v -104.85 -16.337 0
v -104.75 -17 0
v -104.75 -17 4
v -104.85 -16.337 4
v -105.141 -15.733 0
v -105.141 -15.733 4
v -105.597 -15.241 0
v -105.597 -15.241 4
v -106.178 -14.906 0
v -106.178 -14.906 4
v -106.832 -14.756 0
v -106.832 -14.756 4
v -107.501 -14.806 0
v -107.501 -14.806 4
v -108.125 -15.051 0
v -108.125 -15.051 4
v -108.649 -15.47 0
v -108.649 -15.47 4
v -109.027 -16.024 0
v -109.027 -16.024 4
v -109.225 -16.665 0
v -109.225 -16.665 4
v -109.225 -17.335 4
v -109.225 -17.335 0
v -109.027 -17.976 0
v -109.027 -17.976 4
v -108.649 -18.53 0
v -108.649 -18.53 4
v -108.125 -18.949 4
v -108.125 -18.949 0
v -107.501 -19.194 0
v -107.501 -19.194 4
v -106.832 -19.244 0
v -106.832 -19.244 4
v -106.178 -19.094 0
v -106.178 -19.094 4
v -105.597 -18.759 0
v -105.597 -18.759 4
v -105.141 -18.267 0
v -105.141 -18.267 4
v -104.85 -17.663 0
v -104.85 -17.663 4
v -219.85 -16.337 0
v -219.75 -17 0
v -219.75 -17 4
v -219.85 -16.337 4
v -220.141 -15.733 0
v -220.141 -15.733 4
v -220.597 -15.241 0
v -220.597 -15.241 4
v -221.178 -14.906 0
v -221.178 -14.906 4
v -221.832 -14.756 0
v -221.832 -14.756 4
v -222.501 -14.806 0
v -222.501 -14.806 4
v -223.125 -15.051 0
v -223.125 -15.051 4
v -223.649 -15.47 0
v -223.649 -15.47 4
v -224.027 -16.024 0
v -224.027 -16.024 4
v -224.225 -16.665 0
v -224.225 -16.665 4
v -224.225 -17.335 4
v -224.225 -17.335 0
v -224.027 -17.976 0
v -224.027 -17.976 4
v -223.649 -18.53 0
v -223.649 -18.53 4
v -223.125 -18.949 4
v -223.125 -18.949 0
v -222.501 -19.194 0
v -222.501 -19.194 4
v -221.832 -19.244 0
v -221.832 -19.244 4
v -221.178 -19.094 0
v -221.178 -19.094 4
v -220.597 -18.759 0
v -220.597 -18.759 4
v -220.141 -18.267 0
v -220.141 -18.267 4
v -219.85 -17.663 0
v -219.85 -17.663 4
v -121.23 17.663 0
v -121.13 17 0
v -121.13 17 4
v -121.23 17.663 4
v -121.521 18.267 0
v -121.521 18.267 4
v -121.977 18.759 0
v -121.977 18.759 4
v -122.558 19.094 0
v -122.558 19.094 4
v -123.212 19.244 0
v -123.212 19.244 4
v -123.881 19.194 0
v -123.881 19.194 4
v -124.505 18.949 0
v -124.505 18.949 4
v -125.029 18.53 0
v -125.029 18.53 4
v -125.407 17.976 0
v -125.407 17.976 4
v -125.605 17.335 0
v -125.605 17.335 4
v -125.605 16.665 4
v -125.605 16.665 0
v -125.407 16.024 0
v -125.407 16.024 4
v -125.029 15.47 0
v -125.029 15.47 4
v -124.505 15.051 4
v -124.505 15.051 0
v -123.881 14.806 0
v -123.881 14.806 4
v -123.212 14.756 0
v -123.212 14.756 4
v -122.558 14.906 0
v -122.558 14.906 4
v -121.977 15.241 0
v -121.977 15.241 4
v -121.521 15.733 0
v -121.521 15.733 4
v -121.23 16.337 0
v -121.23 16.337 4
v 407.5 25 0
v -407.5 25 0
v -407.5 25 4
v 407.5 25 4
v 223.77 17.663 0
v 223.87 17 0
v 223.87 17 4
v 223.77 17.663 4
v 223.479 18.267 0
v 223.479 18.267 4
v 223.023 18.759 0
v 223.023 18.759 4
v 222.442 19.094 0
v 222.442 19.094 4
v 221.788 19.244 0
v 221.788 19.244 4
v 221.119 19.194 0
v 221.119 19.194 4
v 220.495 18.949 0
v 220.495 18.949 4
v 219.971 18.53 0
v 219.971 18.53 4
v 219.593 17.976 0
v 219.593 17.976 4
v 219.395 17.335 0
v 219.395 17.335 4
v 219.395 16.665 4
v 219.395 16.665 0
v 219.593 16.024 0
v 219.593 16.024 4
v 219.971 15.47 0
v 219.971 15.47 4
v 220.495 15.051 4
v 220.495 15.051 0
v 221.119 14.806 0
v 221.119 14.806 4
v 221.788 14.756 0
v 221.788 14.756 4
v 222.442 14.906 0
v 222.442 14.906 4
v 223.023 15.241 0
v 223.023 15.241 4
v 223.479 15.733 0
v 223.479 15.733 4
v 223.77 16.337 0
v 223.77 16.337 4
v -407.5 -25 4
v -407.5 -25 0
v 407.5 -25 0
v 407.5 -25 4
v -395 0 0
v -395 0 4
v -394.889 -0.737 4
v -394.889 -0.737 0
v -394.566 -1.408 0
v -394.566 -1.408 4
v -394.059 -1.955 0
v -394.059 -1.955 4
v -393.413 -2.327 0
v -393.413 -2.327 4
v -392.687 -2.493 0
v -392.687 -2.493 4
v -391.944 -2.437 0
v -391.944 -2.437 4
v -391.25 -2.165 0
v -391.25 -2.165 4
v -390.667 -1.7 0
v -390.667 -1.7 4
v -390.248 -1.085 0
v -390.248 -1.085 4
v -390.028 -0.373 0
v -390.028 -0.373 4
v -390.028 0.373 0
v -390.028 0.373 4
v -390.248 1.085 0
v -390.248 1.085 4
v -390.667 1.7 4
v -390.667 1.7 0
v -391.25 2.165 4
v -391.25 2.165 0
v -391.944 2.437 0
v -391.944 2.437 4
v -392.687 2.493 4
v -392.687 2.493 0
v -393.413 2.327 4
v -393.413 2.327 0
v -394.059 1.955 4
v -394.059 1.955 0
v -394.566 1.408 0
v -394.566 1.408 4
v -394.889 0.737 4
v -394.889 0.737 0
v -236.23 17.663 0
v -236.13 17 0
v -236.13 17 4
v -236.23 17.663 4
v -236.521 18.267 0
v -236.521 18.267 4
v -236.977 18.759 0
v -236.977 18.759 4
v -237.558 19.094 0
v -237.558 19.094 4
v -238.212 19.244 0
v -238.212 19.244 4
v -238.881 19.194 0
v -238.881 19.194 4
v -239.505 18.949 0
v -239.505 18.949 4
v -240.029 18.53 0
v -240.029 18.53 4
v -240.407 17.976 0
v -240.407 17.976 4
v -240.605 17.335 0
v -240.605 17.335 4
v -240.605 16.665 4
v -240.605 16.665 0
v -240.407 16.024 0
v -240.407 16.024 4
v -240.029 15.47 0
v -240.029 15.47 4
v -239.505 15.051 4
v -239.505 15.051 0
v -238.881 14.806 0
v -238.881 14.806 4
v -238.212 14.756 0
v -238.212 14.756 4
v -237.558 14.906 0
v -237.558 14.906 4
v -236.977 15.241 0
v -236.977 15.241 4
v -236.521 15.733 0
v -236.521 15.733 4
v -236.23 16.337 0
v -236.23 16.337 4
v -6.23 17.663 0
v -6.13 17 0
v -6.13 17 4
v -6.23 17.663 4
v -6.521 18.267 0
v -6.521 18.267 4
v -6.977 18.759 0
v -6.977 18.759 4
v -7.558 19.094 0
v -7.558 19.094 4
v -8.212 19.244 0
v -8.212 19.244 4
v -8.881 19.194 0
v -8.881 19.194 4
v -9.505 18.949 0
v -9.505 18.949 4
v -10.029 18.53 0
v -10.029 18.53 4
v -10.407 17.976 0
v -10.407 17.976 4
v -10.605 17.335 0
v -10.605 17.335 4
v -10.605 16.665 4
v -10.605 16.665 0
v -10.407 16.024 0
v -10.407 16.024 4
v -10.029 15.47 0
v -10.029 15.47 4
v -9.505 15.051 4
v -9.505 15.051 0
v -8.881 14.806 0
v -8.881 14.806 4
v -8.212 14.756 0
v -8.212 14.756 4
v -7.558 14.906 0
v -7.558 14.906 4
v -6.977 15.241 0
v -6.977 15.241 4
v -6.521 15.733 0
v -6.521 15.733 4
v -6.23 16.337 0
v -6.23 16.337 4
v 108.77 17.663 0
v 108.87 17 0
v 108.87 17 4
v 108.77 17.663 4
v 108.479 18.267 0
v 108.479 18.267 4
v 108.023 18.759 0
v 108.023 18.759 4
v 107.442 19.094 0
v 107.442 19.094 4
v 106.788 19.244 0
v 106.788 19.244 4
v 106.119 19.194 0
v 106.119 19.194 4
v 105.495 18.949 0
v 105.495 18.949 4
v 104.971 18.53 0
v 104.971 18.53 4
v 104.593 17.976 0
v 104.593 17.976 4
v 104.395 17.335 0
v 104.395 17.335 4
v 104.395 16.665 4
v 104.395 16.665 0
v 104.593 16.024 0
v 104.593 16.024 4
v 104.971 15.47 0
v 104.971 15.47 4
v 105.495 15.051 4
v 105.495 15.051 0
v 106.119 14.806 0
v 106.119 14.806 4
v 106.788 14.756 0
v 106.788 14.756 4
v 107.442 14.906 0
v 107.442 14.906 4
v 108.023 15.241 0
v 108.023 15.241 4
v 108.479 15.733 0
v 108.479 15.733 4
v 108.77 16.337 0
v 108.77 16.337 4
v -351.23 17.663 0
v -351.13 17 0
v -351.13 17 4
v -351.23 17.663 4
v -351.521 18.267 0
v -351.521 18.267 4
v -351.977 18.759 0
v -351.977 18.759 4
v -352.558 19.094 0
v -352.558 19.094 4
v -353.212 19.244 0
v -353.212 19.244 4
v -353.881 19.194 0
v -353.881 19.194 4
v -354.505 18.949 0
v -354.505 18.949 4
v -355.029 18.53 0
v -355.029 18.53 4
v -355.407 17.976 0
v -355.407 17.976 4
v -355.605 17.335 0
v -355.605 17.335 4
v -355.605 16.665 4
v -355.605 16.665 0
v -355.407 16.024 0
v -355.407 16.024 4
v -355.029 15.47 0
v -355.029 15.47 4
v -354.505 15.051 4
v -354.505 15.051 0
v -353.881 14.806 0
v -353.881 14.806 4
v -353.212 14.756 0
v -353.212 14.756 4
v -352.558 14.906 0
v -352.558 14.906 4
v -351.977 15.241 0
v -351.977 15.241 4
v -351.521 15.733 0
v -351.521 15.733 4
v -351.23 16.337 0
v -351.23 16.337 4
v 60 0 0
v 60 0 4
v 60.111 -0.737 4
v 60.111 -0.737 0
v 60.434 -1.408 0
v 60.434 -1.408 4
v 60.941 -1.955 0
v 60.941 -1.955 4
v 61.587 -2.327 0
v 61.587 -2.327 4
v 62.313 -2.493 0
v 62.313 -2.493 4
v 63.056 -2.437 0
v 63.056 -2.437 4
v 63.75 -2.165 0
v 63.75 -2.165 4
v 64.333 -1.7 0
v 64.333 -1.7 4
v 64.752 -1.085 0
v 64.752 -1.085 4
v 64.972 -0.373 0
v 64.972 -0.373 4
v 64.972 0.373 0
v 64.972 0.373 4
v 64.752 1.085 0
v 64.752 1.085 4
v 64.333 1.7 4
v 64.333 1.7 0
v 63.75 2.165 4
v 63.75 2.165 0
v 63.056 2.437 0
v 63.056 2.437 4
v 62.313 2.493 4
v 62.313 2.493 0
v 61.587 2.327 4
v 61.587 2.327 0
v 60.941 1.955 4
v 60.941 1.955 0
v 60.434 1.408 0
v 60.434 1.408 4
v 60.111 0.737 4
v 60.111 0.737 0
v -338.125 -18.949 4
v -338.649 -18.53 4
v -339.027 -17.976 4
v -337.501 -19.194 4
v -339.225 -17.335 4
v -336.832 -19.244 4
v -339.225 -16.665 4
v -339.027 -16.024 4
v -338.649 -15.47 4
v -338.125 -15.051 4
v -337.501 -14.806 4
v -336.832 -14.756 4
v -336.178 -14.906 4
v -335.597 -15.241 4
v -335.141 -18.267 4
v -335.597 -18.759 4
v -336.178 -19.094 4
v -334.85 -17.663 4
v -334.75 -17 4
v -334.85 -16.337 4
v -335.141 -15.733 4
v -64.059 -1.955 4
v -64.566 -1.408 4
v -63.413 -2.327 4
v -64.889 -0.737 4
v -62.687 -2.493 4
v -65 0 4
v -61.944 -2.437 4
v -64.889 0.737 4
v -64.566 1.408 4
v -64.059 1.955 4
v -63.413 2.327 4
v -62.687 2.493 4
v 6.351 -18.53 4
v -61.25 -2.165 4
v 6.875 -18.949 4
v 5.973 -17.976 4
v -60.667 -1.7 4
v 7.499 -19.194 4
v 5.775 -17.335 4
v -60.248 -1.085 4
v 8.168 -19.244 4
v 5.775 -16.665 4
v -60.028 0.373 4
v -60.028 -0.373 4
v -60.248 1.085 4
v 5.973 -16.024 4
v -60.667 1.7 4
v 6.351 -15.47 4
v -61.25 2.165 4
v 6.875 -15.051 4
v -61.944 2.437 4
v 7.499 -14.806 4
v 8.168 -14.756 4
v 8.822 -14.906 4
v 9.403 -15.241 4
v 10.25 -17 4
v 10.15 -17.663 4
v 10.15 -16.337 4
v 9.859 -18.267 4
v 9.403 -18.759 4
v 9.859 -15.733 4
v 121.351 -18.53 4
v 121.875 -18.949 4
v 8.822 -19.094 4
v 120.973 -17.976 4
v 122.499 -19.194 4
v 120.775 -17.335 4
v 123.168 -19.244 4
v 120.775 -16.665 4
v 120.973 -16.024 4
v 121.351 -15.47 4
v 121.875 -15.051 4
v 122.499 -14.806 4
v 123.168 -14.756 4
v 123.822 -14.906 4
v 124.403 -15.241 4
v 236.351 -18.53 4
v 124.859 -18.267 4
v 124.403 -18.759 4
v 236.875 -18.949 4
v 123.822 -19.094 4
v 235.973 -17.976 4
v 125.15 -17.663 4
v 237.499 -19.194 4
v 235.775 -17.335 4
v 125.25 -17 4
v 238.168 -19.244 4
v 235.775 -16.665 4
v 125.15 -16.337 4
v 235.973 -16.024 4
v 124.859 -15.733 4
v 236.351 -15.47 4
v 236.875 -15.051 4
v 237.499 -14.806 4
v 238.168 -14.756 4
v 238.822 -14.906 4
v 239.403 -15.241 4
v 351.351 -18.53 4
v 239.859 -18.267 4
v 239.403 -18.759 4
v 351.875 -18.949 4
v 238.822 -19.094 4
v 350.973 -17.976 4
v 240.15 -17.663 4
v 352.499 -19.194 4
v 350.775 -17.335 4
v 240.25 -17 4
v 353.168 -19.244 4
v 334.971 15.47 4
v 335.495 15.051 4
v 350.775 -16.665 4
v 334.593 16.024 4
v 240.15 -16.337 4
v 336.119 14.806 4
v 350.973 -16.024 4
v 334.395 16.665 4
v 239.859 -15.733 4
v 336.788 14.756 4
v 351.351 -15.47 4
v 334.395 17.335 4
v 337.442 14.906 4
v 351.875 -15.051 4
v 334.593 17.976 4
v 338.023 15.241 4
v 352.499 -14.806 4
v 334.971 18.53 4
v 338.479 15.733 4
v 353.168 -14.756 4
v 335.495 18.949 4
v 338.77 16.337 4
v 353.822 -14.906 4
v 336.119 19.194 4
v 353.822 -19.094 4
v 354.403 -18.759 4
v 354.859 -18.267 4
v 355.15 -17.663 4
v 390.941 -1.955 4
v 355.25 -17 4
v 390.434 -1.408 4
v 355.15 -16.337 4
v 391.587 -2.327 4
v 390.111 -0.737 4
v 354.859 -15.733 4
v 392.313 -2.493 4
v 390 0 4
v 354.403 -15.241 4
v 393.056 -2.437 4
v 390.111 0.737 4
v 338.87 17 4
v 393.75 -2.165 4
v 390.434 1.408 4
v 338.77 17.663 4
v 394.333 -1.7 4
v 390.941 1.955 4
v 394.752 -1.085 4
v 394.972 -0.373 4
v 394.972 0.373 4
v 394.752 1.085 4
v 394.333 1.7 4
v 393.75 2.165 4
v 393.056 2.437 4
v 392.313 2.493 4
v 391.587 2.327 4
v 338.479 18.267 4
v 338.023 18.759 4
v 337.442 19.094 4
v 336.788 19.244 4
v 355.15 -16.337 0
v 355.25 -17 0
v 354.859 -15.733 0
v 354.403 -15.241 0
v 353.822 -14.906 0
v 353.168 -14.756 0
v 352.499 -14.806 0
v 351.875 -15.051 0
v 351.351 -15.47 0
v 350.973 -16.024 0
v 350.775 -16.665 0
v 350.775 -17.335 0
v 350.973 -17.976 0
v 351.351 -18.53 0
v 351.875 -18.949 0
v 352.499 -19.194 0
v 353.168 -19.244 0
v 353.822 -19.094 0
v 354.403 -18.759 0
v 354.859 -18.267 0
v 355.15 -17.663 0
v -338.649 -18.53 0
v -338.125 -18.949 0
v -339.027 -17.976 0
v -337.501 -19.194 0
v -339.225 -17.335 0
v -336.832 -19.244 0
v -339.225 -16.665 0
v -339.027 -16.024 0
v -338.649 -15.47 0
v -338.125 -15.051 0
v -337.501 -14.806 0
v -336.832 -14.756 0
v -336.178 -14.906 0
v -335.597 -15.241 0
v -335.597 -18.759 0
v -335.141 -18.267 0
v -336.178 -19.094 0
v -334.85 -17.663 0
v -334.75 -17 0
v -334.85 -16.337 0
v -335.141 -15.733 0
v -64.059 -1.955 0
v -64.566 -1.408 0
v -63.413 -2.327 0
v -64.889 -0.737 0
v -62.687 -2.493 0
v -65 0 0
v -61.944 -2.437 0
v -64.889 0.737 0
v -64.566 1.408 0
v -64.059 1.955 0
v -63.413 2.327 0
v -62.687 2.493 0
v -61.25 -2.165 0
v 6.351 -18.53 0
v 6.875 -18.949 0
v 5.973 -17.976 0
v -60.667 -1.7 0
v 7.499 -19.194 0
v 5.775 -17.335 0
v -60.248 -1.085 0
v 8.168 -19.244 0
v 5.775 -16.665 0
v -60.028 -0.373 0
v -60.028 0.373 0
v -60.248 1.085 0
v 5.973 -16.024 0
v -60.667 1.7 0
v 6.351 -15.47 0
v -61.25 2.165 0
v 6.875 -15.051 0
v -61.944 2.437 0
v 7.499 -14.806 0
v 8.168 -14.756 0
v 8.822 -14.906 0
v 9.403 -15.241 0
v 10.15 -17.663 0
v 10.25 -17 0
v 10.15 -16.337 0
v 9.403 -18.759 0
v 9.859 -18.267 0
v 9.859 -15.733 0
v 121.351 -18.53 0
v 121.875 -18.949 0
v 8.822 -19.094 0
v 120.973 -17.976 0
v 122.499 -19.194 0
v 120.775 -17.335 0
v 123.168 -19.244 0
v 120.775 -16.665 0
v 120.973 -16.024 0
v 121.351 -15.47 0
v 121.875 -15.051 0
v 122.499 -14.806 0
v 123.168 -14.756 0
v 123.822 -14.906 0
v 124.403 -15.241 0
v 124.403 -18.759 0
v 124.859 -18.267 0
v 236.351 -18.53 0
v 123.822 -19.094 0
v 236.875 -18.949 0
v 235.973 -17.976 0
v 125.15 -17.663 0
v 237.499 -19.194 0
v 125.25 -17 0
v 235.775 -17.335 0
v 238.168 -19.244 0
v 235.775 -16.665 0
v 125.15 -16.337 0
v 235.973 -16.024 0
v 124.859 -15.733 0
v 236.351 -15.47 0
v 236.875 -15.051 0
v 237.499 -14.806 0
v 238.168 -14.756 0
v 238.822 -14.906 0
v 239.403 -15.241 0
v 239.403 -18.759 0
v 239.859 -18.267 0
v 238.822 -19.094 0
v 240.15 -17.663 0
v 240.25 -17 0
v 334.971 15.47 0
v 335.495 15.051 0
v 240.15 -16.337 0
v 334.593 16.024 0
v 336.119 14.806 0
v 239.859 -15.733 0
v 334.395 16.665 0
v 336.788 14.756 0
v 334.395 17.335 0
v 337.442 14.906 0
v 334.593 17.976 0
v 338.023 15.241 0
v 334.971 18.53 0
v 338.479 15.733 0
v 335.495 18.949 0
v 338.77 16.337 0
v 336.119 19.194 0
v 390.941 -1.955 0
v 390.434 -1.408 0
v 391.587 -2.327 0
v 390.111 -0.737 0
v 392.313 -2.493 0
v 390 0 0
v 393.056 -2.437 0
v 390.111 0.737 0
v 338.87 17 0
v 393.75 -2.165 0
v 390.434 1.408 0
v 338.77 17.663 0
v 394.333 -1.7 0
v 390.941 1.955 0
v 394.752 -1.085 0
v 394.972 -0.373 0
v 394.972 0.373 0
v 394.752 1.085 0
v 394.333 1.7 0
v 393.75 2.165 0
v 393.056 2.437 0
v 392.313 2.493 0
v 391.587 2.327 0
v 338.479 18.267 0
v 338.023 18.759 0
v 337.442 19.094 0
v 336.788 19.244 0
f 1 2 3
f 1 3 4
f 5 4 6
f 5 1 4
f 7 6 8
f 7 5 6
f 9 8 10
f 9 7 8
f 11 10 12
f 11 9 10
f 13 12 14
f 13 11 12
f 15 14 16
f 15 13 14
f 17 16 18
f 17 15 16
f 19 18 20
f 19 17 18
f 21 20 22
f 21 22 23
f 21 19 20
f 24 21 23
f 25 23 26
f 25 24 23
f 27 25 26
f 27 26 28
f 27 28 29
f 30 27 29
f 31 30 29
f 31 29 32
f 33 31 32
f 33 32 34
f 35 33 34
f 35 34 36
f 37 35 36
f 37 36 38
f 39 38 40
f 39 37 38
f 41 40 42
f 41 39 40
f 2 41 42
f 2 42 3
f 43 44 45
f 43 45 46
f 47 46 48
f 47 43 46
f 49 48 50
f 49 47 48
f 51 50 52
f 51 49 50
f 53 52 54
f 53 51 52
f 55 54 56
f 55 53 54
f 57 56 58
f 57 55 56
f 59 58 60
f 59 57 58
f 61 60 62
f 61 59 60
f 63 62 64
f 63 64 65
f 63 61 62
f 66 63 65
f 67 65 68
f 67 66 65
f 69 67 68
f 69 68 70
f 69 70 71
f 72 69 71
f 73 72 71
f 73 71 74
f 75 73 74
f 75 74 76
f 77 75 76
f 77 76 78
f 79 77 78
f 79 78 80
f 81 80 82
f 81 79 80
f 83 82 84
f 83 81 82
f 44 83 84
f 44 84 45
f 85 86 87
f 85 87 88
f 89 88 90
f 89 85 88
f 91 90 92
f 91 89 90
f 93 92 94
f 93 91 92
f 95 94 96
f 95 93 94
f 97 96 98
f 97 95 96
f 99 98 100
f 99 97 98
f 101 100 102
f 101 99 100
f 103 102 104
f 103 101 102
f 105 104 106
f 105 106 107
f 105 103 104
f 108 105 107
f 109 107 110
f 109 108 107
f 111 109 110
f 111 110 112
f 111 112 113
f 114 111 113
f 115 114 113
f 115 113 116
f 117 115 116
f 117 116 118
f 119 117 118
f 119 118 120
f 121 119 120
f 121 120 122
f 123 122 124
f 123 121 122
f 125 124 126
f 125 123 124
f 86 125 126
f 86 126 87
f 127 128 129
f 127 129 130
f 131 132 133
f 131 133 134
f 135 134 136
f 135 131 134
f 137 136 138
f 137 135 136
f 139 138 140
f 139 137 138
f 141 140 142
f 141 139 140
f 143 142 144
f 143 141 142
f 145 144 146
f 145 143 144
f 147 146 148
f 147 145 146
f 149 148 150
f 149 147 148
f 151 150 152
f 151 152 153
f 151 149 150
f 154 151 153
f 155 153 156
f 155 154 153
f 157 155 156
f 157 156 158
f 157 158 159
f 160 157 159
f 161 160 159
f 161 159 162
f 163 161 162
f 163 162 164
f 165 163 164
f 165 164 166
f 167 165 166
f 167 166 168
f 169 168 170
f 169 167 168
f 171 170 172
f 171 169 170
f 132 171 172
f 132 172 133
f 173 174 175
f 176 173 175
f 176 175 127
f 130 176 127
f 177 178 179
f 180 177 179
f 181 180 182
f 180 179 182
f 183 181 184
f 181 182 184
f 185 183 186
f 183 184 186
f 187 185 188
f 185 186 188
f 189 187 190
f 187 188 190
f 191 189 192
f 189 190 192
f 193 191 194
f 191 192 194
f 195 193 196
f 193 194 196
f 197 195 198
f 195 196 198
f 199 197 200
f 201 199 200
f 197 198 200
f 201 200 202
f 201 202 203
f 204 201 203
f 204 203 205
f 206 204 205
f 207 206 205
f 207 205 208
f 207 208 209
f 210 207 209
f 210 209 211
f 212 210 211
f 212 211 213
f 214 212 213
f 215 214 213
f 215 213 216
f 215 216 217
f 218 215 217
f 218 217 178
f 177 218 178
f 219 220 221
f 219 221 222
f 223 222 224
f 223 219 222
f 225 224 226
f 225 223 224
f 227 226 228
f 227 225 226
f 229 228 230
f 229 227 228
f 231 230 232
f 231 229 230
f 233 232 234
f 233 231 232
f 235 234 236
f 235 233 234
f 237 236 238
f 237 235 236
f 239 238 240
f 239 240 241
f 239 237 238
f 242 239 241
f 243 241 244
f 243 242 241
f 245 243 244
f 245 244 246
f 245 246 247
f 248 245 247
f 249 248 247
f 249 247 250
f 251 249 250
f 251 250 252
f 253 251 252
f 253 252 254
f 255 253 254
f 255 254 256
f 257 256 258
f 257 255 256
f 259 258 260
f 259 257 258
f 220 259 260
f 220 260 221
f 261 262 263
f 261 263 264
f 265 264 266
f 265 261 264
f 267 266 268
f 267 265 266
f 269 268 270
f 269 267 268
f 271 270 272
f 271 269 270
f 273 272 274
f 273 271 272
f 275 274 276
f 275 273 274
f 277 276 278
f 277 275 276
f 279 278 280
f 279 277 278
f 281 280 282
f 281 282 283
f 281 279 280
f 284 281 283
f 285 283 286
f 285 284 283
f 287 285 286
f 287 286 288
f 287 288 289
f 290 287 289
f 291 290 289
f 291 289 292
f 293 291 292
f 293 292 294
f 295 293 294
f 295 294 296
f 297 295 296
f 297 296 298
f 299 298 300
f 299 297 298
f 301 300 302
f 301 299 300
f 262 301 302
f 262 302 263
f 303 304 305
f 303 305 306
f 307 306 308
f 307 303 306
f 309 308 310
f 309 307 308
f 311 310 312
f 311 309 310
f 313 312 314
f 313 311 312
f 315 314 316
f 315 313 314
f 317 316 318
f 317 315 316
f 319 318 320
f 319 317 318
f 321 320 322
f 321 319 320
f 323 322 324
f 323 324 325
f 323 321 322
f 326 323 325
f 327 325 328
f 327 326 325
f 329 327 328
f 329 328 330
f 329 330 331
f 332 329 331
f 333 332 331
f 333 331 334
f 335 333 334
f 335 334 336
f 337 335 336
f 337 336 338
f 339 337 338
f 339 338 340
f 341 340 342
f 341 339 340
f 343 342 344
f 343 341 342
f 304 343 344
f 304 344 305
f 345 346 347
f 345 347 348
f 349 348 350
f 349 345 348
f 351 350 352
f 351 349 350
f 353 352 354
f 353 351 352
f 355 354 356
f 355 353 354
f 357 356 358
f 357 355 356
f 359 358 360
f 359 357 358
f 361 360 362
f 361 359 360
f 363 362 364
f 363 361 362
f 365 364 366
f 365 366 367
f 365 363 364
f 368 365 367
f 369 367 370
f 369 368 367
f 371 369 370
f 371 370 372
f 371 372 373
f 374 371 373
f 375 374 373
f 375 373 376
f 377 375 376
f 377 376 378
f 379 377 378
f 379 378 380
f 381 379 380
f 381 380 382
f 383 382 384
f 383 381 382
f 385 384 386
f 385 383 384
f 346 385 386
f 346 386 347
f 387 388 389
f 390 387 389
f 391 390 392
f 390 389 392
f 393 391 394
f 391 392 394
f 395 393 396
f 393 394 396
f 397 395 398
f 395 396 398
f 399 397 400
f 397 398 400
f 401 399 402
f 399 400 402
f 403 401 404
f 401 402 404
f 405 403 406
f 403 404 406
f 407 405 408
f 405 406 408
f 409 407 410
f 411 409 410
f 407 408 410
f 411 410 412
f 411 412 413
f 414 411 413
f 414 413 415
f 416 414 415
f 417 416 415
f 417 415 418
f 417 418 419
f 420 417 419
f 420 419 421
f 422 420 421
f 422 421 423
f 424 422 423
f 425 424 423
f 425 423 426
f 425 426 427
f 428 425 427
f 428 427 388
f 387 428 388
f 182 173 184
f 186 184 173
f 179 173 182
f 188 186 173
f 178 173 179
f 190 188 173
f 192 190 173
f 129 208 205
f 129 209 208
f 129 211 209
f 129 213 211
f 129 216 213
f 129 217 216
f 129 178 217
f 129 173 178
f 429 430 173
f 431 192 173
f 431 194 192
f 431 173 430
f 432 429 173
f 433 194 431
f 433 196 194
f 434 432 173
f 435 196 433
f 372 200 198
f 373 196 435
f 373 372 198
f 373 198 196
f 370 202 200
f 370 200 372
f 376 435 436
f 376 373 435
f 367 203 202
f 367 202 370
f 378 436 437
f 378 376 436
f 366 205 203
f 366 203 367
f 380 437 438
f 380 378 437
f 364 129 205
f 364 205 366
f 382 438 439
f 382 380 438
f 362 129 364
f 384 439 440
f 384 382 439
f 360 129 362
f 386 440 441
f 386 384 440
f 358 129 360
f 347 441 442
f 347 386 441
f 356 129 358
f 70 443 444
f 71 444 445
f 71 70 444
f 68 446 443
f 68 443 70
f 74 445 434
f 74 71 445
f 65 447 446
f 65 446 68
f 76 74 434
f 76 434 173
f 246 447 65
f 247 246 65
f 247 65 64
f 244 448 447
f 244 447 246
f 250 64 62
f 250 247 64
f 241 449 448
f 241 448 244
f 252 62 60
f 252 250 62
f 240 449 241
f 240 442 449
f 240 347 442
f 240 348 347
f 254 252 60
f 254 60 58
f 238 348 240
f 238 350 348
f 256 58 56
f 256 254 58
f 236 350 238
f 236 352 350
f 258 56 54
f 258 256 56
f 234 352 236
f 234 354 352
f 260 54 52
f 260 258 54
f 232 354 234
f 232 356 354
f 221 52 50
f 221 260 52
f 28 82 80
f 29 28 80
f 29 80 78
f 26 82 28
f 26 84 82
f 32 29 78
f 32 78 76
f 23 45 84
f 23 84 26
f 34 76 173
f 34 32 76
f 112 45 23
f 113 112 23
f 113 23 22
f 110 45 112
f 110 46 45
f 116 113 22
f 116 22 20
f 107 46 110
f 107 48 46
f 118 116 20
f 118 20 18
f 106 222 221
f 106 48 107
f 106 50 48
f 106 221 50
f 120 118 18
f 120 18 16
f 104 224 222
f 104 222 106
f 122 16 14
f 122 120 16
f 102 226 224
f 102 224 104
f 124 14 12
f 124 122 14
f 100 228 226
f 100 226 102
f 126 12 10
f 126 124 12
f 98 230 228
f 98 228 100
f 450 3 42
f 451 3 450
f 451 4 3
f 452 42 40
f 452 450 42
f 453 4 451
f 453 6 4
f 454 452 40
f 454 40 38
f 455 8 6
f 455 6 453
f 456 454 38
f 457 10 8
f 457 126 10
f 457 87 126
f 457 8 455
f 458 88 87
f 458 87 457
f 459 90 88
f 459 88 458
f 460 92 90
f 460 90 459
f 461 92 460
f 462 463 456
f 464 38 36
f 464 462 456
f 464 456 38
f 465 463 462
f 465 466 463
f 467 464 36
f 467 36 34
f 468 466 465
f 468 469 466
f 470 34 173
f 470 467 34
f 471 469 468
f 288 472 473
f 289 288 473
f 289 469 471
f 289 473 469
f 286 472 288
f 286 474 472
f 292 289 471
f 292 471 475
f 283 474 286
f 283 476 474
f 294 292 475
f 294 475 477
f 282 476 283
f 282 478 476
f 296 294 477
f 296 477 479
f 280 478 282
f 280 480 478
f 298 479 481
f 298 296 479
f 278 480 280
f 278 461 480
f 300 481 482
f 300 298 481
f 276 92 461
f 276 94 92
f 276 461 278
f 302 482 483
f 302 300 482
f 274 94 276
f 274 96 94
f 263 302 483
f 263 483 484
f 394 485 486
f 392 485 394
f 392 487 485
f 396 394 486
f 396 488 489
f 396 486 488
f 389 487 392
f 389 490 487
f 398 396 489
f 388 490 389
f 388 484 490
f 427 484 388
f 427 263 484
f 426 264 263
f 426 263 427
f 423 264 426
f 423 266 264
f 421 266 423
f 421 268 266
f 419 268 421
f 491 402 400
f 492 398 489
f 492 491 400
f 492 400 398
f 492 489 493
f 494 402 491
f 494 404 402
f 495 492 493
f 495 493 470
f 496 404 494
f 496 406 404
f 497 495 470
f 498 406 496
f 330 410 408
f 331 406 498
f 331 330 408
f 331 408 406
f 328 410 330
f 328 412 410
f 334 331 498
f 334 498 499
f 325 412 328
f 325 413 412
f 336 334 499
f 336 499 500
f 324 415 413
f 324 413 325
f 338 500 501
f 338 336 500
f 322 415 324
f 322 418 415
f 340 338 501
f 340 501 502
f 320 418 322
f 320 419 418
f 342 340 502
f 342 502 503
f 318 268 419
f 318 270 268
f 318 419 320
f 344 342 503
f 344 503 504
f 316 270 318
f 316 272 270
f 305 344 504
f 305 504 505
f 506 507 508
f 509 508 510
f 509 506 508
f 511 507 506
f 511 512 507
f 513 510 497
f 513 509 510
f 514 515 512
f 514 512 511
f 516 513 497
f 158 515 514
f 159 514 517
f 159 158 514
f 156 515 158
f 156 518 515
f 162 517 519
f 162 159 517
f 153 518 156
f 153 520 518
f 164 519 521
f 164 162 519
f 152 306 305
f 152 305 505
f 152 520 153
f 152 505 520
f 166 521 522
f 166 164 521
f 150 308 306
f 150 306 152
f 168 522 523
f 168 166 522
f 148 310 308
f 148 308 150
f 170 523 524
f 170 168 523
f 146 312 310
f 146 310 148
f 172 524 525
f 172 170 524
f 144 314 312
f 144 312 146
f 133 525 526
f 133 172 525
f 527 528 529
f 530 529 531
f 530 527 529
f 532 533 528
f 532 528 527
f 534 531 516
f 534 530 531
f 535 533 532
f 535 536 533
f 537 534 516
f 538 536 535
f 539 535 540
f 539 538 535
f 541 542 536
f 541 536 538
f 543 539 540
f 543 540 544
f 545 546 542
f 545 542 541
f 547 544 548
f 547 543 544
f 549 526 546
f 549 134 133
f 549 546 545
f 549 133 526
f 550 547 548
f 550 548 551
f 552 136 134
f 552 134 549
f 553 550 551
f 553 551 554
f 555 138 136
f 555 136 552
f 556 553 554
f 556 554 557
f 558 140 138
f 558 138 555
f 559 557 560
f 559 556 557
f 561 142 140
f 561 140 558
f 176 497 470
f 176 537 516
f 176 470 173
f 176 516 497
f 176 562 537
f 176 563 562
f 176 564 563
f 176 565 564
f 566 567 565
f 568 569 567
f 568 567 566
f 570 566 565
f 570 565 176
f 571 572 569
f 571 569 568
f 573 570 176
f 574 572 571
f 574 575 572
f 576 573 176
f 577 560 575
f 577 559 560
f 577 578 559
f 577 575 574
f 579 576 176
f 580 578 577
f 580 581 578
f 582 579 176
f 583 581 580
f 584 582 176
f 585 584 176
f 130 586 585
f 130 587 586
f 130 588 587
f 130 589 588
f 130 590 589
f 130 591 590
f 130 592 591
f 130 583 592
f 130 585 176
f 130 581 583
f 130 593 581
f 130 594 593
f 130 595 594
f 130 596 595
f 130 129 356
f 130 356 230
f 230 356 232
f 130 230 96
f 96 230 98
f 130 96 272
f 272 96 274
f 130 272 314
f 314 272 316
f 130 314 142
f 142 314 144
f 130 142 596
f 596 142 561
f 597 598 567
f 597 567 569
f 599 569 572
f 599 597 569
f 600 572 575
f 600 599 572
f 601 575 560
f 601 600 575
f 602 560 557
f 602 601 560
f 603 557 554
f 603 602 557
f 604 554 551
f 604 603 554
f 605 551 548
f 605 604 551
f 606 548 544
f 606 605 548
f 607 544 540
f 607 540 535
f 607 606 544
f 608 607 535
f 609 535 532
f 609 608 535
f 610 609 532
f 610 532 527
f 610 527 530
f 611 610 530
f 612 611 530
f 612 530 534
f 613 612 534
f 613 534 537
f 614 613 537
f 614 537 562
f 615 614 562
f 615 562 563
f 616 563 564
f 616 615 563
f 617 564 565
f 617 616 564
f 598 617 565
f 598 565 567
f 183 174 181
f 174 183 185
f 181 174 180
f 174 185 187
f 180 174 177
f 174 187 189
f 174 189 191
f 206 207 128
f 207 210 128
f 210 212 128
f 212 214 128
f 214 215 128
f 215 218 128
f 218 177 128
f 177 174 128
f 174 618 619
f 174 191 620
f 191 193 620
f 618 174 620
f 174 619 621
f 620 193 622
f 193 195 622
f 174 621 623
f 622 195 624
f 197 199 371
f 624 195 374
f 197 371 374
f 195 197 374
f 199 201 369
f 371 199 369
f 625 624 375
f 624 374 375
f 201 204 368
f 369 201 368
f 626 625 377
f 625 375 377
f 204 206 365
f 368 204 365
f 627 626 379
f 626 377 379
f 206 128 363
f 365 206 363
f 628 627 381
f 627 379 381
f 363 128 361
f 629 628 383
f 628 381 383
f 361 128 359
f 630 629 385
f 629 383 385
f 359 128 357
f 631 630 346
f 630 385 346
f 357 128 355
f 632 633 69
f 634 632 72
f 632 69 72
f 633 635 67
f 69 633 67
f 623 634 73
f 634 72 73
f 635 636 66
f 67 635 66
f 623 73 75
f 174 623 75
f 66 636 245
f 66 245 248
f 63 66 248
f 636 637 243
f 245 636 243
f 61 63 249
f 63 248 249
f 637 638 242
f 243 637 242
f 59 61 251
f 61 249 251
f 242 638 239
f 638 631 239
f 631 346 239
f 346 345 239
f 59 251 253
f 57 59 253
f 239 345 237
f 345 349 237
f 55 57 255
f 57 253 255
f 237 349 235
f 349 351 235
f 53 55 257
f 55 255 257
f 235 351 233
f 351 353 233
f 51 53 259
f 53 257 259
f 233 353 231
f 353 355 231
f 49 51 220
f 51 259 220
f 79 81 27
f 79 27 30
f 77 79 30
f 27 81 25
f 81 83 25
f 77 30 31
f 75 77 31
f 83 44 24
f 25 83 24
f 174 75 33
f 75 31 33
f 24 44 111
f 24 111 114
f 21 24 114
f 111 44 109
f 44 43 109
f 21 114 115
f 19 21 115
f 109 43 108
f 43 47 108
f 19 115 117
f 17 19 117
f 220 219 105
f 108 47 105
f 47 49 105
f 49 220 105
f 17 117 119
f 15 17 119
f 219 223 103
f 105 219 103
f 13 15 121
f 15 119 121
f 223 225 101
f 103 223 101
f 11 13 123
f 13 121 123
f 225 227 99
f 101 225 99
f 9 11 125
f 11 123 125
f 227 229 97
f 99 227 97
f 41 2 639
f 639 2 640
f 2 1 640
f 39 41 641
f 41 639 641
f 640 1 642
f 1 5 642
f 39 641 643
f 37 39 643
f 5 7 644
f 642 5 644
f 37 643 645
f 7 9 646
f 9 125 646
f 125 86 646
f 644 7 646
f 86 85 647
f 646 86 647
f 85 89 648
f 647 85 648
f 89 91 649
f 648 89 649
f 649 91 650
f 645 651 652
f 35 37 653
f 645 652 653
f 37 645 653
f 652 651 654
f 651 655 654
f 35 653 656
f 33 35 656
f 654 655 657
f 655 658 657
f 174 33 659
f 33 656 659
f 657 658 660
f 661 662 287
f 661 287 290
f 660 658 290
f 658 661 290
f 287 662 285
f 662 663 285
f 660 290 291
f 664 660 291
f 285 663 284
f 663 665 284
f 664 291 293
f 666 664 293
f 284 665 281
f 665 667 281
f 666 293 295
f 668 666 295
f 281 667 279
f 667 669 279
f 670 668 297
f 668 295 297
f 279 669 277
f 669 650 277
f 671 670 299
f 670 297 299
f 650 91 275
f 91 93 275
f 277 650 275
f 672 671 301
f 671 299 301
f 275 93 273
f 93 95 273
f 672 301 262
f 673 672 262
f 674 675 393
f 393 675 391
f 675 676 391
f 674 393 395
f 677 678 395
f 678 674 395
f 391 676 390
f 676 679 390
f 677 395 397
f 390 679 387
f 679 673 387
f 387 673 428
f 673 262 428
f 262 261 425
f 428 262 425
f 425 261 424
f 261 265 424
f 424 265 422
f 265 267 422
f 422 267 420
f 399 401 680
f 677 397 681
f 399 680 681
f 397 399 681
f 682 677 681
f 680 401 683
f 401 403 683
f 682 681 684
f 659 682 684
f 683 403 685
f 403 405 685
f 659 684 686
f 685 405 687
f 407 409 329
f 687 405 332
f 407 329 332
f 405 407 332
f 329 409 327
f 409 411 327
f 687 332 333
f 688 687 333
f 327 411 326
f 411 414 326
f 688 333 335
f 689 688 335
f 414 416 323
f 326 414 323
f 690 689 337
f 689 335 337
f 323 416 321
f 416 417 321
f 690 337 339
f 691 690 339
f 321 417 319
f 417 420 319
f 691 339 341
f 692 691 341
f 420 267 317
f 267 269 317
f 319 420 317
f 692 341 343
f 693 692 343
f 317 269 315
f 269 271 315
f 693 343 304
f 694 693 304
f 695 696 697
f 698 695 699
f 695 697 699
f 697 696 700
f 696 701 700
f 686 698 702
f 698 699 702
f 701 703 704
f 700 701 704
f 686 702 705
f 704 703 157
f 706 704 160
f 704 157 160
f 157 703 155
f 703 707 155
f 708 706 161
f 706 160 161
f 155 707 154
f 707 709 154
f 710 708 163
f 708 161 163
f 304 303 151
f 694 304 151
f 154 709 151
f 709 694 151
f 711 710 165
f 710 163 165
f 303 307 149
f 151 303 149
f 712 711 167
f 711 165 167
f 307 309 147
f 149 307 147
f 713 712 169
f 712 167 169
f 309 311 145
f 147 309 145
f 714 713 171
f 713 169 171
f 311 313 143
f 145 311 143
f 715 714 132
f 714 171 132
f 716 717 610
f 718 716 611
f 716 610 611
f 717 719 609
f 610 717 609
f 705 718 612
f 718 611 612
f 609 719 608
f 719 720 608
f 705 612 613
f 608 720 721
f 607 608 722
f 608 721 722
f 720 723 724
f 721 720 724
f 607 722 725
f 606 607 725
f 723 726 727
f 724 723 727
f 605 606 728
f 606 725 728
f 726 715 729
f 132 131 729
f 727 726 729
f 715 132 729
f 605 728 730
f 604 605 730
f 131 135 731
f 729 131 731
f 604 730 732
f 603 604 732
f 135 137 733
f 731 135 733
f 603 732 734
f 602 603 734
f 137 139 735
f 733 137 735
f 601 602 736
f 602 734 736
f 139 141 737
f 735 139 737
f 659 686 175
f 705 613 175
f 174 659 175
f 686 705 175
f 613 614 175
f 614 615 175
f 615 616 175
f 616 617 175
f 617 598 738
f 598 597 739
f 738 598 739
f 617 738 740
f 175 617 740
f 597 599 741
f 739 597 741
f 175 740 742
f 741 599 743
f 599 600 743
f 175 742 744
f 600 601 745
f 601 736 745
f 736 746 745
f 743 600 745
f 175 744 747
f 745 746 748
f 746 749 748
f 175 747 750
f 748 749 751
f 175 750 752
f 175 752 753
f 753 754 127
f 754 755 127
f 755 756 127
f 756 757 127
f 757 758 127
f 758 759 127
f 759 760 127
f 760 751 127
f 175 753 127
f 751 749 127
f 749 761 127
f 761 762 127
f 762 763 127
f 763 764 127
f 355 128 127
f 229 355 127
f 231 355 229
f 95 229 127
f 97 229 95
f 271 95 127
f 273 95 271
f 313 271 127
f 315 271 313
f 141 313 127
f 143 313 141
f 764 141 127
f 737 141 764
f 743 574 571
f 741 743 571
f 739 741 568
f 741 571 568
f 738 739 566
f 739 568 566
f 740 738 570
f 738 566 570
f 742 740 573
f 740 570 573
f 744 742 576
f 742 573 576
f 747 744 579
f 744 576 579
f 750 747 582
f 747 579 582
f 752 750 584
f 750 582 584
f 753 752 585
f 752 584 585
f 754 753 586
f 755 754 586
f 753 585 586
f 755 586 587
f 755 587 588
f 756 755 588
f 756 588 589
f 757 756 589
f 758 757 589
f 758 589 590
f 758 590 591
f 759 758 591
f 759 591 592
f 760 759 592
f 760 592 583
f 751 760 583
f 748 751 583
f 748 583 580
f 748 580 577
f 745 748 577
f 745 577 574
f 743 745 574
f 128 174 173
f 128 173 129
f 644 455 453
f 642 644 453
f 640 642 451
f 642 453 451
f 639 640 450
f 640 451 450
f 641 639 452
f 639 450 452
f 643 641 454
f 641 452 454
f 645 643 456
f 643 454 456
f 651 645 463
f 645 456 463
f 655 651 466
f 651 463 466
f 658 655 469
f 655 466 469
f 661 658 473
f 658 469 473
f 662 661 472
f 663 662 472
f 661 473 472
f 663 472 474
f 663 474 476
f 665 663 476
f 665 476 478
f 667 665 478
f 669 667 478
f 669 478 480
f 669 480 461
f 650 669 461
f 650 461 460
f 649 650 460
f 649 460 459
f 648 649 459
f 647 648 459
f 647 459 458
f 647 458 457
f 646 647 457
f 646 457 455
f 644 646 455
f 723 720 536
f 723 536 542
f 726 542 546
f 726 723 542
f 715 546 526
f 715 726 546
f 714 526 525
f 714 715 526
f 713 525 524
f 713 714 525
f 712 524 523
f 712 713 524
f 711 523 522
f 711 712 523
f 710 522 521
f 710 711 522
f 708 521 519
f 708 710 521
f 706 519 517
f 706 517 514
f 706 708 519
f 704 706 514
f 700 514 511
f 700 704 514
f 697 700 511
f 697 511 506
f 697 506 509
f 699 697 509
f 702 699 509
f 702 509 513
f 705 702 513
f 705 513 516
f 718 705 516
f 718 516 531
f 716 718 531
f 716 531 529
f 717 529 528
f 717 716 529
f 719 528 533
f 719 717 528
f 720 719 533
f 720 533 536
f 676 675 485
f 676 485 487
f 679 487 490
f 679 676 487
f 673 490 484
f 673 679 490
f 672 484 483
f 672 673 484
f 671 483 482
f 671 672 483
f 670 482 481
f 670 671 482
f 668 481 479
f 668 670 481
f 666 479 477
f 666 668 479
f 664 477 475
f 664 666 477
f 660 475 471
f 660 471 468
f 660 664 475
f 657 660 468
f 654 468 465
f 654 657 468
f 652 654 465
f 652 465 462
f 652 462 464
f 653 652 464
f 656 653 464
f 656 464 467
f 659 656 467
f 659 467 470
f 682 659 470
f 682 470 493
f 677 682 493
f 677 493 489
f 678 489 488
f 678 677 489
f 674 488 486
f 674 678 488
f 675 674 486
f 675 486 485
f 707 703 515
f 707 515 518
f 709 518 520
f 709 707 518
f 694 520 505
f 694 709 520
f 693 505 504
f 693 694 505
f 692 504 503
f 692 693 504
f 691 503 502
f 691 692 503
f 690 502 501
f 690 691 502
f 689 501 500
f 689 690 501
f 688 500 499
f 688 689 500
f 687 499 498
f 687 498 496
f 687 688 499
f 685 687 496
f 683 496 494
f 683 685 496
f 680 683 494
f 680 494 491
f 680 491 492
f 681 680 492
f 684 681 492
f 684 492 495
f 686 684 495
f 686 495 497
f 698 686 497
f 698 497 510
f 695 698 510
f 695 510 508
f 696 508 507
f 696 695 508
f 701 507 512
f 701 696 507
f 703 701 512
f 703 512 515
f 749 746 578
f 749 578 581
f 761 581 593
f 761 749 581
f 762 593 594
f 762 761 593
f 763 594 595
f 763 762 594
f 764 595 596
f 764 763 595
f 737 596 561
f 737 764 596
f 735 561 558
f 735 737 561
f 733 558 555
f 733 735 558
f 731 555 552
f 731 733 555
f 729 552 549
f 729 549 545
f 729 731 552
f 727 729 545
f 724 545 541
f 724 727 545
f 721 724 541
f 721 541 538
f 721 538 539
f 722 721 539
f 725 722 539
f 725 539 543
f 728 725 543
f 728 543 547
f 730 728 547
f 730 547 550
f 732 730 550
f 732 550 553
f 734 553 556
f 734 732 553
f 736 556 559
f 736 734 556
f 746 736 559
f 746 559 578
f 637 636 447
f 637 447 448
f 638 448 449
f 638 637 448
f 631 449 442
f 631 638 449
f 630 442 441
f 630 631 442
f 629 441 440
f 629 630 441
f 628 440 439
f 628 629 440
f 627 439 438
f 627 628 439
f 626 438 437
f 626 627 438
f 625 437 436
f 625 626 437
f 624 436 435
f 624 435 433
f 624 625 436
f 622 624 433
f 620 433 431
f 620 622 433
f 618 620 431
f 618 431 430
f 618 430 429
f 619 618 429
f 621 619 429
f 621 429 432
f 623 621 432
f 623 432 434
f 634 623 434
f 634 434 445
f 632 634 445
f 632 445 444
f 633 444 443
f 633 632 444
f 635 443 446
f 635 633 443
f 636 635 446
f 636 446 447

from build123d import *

# Parameters (mm, degrees)
F0_W     = 815
F0_H     = 50
F0_R     = 2.25
F1_DEPTH = 4
F2_D     = 5


with BuildPart() as f1:
    # F0 (on Top) → F1 (new body)
    with BuildSketch(Plane.XY):
        Rectangle(F0_W, F0_H)
        with Locations((-337, -17)):
            Circle(F0_R, mode=Mode.SUBTRACT)
        with Locations((-222, -17)):
            Circle(F0_R, mode=Mode.SUBTRACT)
        with Locations((-107, -17)):
            Circle(F0_R, mode=Mode.SUBTRACT)
        with Locations((8, -17)):
            Circle(F0_R, mode=Mode.SUBTRACT)
        with Locations((123, -17)):
            Circle(F0_R, mode=Mode.SUBTRACT)
        with Locations((238, -17)):
            Circle(F0_R, mode=Mode.SUBTRACT)
        with Locations((353, -17)):
            Circle(F0_R, mode=Mode.SUBTRACT)
        with Locations((-353.38, 17)):
            Circle(F0_R, mode=Mode.SUBTRACT)
        with Locations((-238.38, 17)):
            Circle(F0_R, mode=Mode.SUBTRACT)
        with Locations((-123.38, 17)):
            Circle(F0_R, mode=Mode.SUBTRACT)
        with Locations((-8.38, 17)):
            Circle(F0_R, mode=Mode.SUBTRACT)
        with Locations((106.62, 17)):
            Circle(F0_R, mode=Mode.SUBTRACT)
        with Locations((221.62, 17)):
            Circle(F0_R, mode=Mode.SUBTRACT)
        with Locations((336.62, 17)):
            Circle(F0_R, mode=Mode.SUBTRACT)
    extrude(amount=F1_DEPTH)

    # F2 (through all)
    with Locations(Plane(origin=(0, 0, 0), x_dir=(1, 0, 0), z_dir=(0, 0, -1))):
        with Locations((-392.5, 0), (-62.5, 0), (62.5, 0), (392.5, 0)):
            Hole(F2_D / 2)


solid = f1.part
